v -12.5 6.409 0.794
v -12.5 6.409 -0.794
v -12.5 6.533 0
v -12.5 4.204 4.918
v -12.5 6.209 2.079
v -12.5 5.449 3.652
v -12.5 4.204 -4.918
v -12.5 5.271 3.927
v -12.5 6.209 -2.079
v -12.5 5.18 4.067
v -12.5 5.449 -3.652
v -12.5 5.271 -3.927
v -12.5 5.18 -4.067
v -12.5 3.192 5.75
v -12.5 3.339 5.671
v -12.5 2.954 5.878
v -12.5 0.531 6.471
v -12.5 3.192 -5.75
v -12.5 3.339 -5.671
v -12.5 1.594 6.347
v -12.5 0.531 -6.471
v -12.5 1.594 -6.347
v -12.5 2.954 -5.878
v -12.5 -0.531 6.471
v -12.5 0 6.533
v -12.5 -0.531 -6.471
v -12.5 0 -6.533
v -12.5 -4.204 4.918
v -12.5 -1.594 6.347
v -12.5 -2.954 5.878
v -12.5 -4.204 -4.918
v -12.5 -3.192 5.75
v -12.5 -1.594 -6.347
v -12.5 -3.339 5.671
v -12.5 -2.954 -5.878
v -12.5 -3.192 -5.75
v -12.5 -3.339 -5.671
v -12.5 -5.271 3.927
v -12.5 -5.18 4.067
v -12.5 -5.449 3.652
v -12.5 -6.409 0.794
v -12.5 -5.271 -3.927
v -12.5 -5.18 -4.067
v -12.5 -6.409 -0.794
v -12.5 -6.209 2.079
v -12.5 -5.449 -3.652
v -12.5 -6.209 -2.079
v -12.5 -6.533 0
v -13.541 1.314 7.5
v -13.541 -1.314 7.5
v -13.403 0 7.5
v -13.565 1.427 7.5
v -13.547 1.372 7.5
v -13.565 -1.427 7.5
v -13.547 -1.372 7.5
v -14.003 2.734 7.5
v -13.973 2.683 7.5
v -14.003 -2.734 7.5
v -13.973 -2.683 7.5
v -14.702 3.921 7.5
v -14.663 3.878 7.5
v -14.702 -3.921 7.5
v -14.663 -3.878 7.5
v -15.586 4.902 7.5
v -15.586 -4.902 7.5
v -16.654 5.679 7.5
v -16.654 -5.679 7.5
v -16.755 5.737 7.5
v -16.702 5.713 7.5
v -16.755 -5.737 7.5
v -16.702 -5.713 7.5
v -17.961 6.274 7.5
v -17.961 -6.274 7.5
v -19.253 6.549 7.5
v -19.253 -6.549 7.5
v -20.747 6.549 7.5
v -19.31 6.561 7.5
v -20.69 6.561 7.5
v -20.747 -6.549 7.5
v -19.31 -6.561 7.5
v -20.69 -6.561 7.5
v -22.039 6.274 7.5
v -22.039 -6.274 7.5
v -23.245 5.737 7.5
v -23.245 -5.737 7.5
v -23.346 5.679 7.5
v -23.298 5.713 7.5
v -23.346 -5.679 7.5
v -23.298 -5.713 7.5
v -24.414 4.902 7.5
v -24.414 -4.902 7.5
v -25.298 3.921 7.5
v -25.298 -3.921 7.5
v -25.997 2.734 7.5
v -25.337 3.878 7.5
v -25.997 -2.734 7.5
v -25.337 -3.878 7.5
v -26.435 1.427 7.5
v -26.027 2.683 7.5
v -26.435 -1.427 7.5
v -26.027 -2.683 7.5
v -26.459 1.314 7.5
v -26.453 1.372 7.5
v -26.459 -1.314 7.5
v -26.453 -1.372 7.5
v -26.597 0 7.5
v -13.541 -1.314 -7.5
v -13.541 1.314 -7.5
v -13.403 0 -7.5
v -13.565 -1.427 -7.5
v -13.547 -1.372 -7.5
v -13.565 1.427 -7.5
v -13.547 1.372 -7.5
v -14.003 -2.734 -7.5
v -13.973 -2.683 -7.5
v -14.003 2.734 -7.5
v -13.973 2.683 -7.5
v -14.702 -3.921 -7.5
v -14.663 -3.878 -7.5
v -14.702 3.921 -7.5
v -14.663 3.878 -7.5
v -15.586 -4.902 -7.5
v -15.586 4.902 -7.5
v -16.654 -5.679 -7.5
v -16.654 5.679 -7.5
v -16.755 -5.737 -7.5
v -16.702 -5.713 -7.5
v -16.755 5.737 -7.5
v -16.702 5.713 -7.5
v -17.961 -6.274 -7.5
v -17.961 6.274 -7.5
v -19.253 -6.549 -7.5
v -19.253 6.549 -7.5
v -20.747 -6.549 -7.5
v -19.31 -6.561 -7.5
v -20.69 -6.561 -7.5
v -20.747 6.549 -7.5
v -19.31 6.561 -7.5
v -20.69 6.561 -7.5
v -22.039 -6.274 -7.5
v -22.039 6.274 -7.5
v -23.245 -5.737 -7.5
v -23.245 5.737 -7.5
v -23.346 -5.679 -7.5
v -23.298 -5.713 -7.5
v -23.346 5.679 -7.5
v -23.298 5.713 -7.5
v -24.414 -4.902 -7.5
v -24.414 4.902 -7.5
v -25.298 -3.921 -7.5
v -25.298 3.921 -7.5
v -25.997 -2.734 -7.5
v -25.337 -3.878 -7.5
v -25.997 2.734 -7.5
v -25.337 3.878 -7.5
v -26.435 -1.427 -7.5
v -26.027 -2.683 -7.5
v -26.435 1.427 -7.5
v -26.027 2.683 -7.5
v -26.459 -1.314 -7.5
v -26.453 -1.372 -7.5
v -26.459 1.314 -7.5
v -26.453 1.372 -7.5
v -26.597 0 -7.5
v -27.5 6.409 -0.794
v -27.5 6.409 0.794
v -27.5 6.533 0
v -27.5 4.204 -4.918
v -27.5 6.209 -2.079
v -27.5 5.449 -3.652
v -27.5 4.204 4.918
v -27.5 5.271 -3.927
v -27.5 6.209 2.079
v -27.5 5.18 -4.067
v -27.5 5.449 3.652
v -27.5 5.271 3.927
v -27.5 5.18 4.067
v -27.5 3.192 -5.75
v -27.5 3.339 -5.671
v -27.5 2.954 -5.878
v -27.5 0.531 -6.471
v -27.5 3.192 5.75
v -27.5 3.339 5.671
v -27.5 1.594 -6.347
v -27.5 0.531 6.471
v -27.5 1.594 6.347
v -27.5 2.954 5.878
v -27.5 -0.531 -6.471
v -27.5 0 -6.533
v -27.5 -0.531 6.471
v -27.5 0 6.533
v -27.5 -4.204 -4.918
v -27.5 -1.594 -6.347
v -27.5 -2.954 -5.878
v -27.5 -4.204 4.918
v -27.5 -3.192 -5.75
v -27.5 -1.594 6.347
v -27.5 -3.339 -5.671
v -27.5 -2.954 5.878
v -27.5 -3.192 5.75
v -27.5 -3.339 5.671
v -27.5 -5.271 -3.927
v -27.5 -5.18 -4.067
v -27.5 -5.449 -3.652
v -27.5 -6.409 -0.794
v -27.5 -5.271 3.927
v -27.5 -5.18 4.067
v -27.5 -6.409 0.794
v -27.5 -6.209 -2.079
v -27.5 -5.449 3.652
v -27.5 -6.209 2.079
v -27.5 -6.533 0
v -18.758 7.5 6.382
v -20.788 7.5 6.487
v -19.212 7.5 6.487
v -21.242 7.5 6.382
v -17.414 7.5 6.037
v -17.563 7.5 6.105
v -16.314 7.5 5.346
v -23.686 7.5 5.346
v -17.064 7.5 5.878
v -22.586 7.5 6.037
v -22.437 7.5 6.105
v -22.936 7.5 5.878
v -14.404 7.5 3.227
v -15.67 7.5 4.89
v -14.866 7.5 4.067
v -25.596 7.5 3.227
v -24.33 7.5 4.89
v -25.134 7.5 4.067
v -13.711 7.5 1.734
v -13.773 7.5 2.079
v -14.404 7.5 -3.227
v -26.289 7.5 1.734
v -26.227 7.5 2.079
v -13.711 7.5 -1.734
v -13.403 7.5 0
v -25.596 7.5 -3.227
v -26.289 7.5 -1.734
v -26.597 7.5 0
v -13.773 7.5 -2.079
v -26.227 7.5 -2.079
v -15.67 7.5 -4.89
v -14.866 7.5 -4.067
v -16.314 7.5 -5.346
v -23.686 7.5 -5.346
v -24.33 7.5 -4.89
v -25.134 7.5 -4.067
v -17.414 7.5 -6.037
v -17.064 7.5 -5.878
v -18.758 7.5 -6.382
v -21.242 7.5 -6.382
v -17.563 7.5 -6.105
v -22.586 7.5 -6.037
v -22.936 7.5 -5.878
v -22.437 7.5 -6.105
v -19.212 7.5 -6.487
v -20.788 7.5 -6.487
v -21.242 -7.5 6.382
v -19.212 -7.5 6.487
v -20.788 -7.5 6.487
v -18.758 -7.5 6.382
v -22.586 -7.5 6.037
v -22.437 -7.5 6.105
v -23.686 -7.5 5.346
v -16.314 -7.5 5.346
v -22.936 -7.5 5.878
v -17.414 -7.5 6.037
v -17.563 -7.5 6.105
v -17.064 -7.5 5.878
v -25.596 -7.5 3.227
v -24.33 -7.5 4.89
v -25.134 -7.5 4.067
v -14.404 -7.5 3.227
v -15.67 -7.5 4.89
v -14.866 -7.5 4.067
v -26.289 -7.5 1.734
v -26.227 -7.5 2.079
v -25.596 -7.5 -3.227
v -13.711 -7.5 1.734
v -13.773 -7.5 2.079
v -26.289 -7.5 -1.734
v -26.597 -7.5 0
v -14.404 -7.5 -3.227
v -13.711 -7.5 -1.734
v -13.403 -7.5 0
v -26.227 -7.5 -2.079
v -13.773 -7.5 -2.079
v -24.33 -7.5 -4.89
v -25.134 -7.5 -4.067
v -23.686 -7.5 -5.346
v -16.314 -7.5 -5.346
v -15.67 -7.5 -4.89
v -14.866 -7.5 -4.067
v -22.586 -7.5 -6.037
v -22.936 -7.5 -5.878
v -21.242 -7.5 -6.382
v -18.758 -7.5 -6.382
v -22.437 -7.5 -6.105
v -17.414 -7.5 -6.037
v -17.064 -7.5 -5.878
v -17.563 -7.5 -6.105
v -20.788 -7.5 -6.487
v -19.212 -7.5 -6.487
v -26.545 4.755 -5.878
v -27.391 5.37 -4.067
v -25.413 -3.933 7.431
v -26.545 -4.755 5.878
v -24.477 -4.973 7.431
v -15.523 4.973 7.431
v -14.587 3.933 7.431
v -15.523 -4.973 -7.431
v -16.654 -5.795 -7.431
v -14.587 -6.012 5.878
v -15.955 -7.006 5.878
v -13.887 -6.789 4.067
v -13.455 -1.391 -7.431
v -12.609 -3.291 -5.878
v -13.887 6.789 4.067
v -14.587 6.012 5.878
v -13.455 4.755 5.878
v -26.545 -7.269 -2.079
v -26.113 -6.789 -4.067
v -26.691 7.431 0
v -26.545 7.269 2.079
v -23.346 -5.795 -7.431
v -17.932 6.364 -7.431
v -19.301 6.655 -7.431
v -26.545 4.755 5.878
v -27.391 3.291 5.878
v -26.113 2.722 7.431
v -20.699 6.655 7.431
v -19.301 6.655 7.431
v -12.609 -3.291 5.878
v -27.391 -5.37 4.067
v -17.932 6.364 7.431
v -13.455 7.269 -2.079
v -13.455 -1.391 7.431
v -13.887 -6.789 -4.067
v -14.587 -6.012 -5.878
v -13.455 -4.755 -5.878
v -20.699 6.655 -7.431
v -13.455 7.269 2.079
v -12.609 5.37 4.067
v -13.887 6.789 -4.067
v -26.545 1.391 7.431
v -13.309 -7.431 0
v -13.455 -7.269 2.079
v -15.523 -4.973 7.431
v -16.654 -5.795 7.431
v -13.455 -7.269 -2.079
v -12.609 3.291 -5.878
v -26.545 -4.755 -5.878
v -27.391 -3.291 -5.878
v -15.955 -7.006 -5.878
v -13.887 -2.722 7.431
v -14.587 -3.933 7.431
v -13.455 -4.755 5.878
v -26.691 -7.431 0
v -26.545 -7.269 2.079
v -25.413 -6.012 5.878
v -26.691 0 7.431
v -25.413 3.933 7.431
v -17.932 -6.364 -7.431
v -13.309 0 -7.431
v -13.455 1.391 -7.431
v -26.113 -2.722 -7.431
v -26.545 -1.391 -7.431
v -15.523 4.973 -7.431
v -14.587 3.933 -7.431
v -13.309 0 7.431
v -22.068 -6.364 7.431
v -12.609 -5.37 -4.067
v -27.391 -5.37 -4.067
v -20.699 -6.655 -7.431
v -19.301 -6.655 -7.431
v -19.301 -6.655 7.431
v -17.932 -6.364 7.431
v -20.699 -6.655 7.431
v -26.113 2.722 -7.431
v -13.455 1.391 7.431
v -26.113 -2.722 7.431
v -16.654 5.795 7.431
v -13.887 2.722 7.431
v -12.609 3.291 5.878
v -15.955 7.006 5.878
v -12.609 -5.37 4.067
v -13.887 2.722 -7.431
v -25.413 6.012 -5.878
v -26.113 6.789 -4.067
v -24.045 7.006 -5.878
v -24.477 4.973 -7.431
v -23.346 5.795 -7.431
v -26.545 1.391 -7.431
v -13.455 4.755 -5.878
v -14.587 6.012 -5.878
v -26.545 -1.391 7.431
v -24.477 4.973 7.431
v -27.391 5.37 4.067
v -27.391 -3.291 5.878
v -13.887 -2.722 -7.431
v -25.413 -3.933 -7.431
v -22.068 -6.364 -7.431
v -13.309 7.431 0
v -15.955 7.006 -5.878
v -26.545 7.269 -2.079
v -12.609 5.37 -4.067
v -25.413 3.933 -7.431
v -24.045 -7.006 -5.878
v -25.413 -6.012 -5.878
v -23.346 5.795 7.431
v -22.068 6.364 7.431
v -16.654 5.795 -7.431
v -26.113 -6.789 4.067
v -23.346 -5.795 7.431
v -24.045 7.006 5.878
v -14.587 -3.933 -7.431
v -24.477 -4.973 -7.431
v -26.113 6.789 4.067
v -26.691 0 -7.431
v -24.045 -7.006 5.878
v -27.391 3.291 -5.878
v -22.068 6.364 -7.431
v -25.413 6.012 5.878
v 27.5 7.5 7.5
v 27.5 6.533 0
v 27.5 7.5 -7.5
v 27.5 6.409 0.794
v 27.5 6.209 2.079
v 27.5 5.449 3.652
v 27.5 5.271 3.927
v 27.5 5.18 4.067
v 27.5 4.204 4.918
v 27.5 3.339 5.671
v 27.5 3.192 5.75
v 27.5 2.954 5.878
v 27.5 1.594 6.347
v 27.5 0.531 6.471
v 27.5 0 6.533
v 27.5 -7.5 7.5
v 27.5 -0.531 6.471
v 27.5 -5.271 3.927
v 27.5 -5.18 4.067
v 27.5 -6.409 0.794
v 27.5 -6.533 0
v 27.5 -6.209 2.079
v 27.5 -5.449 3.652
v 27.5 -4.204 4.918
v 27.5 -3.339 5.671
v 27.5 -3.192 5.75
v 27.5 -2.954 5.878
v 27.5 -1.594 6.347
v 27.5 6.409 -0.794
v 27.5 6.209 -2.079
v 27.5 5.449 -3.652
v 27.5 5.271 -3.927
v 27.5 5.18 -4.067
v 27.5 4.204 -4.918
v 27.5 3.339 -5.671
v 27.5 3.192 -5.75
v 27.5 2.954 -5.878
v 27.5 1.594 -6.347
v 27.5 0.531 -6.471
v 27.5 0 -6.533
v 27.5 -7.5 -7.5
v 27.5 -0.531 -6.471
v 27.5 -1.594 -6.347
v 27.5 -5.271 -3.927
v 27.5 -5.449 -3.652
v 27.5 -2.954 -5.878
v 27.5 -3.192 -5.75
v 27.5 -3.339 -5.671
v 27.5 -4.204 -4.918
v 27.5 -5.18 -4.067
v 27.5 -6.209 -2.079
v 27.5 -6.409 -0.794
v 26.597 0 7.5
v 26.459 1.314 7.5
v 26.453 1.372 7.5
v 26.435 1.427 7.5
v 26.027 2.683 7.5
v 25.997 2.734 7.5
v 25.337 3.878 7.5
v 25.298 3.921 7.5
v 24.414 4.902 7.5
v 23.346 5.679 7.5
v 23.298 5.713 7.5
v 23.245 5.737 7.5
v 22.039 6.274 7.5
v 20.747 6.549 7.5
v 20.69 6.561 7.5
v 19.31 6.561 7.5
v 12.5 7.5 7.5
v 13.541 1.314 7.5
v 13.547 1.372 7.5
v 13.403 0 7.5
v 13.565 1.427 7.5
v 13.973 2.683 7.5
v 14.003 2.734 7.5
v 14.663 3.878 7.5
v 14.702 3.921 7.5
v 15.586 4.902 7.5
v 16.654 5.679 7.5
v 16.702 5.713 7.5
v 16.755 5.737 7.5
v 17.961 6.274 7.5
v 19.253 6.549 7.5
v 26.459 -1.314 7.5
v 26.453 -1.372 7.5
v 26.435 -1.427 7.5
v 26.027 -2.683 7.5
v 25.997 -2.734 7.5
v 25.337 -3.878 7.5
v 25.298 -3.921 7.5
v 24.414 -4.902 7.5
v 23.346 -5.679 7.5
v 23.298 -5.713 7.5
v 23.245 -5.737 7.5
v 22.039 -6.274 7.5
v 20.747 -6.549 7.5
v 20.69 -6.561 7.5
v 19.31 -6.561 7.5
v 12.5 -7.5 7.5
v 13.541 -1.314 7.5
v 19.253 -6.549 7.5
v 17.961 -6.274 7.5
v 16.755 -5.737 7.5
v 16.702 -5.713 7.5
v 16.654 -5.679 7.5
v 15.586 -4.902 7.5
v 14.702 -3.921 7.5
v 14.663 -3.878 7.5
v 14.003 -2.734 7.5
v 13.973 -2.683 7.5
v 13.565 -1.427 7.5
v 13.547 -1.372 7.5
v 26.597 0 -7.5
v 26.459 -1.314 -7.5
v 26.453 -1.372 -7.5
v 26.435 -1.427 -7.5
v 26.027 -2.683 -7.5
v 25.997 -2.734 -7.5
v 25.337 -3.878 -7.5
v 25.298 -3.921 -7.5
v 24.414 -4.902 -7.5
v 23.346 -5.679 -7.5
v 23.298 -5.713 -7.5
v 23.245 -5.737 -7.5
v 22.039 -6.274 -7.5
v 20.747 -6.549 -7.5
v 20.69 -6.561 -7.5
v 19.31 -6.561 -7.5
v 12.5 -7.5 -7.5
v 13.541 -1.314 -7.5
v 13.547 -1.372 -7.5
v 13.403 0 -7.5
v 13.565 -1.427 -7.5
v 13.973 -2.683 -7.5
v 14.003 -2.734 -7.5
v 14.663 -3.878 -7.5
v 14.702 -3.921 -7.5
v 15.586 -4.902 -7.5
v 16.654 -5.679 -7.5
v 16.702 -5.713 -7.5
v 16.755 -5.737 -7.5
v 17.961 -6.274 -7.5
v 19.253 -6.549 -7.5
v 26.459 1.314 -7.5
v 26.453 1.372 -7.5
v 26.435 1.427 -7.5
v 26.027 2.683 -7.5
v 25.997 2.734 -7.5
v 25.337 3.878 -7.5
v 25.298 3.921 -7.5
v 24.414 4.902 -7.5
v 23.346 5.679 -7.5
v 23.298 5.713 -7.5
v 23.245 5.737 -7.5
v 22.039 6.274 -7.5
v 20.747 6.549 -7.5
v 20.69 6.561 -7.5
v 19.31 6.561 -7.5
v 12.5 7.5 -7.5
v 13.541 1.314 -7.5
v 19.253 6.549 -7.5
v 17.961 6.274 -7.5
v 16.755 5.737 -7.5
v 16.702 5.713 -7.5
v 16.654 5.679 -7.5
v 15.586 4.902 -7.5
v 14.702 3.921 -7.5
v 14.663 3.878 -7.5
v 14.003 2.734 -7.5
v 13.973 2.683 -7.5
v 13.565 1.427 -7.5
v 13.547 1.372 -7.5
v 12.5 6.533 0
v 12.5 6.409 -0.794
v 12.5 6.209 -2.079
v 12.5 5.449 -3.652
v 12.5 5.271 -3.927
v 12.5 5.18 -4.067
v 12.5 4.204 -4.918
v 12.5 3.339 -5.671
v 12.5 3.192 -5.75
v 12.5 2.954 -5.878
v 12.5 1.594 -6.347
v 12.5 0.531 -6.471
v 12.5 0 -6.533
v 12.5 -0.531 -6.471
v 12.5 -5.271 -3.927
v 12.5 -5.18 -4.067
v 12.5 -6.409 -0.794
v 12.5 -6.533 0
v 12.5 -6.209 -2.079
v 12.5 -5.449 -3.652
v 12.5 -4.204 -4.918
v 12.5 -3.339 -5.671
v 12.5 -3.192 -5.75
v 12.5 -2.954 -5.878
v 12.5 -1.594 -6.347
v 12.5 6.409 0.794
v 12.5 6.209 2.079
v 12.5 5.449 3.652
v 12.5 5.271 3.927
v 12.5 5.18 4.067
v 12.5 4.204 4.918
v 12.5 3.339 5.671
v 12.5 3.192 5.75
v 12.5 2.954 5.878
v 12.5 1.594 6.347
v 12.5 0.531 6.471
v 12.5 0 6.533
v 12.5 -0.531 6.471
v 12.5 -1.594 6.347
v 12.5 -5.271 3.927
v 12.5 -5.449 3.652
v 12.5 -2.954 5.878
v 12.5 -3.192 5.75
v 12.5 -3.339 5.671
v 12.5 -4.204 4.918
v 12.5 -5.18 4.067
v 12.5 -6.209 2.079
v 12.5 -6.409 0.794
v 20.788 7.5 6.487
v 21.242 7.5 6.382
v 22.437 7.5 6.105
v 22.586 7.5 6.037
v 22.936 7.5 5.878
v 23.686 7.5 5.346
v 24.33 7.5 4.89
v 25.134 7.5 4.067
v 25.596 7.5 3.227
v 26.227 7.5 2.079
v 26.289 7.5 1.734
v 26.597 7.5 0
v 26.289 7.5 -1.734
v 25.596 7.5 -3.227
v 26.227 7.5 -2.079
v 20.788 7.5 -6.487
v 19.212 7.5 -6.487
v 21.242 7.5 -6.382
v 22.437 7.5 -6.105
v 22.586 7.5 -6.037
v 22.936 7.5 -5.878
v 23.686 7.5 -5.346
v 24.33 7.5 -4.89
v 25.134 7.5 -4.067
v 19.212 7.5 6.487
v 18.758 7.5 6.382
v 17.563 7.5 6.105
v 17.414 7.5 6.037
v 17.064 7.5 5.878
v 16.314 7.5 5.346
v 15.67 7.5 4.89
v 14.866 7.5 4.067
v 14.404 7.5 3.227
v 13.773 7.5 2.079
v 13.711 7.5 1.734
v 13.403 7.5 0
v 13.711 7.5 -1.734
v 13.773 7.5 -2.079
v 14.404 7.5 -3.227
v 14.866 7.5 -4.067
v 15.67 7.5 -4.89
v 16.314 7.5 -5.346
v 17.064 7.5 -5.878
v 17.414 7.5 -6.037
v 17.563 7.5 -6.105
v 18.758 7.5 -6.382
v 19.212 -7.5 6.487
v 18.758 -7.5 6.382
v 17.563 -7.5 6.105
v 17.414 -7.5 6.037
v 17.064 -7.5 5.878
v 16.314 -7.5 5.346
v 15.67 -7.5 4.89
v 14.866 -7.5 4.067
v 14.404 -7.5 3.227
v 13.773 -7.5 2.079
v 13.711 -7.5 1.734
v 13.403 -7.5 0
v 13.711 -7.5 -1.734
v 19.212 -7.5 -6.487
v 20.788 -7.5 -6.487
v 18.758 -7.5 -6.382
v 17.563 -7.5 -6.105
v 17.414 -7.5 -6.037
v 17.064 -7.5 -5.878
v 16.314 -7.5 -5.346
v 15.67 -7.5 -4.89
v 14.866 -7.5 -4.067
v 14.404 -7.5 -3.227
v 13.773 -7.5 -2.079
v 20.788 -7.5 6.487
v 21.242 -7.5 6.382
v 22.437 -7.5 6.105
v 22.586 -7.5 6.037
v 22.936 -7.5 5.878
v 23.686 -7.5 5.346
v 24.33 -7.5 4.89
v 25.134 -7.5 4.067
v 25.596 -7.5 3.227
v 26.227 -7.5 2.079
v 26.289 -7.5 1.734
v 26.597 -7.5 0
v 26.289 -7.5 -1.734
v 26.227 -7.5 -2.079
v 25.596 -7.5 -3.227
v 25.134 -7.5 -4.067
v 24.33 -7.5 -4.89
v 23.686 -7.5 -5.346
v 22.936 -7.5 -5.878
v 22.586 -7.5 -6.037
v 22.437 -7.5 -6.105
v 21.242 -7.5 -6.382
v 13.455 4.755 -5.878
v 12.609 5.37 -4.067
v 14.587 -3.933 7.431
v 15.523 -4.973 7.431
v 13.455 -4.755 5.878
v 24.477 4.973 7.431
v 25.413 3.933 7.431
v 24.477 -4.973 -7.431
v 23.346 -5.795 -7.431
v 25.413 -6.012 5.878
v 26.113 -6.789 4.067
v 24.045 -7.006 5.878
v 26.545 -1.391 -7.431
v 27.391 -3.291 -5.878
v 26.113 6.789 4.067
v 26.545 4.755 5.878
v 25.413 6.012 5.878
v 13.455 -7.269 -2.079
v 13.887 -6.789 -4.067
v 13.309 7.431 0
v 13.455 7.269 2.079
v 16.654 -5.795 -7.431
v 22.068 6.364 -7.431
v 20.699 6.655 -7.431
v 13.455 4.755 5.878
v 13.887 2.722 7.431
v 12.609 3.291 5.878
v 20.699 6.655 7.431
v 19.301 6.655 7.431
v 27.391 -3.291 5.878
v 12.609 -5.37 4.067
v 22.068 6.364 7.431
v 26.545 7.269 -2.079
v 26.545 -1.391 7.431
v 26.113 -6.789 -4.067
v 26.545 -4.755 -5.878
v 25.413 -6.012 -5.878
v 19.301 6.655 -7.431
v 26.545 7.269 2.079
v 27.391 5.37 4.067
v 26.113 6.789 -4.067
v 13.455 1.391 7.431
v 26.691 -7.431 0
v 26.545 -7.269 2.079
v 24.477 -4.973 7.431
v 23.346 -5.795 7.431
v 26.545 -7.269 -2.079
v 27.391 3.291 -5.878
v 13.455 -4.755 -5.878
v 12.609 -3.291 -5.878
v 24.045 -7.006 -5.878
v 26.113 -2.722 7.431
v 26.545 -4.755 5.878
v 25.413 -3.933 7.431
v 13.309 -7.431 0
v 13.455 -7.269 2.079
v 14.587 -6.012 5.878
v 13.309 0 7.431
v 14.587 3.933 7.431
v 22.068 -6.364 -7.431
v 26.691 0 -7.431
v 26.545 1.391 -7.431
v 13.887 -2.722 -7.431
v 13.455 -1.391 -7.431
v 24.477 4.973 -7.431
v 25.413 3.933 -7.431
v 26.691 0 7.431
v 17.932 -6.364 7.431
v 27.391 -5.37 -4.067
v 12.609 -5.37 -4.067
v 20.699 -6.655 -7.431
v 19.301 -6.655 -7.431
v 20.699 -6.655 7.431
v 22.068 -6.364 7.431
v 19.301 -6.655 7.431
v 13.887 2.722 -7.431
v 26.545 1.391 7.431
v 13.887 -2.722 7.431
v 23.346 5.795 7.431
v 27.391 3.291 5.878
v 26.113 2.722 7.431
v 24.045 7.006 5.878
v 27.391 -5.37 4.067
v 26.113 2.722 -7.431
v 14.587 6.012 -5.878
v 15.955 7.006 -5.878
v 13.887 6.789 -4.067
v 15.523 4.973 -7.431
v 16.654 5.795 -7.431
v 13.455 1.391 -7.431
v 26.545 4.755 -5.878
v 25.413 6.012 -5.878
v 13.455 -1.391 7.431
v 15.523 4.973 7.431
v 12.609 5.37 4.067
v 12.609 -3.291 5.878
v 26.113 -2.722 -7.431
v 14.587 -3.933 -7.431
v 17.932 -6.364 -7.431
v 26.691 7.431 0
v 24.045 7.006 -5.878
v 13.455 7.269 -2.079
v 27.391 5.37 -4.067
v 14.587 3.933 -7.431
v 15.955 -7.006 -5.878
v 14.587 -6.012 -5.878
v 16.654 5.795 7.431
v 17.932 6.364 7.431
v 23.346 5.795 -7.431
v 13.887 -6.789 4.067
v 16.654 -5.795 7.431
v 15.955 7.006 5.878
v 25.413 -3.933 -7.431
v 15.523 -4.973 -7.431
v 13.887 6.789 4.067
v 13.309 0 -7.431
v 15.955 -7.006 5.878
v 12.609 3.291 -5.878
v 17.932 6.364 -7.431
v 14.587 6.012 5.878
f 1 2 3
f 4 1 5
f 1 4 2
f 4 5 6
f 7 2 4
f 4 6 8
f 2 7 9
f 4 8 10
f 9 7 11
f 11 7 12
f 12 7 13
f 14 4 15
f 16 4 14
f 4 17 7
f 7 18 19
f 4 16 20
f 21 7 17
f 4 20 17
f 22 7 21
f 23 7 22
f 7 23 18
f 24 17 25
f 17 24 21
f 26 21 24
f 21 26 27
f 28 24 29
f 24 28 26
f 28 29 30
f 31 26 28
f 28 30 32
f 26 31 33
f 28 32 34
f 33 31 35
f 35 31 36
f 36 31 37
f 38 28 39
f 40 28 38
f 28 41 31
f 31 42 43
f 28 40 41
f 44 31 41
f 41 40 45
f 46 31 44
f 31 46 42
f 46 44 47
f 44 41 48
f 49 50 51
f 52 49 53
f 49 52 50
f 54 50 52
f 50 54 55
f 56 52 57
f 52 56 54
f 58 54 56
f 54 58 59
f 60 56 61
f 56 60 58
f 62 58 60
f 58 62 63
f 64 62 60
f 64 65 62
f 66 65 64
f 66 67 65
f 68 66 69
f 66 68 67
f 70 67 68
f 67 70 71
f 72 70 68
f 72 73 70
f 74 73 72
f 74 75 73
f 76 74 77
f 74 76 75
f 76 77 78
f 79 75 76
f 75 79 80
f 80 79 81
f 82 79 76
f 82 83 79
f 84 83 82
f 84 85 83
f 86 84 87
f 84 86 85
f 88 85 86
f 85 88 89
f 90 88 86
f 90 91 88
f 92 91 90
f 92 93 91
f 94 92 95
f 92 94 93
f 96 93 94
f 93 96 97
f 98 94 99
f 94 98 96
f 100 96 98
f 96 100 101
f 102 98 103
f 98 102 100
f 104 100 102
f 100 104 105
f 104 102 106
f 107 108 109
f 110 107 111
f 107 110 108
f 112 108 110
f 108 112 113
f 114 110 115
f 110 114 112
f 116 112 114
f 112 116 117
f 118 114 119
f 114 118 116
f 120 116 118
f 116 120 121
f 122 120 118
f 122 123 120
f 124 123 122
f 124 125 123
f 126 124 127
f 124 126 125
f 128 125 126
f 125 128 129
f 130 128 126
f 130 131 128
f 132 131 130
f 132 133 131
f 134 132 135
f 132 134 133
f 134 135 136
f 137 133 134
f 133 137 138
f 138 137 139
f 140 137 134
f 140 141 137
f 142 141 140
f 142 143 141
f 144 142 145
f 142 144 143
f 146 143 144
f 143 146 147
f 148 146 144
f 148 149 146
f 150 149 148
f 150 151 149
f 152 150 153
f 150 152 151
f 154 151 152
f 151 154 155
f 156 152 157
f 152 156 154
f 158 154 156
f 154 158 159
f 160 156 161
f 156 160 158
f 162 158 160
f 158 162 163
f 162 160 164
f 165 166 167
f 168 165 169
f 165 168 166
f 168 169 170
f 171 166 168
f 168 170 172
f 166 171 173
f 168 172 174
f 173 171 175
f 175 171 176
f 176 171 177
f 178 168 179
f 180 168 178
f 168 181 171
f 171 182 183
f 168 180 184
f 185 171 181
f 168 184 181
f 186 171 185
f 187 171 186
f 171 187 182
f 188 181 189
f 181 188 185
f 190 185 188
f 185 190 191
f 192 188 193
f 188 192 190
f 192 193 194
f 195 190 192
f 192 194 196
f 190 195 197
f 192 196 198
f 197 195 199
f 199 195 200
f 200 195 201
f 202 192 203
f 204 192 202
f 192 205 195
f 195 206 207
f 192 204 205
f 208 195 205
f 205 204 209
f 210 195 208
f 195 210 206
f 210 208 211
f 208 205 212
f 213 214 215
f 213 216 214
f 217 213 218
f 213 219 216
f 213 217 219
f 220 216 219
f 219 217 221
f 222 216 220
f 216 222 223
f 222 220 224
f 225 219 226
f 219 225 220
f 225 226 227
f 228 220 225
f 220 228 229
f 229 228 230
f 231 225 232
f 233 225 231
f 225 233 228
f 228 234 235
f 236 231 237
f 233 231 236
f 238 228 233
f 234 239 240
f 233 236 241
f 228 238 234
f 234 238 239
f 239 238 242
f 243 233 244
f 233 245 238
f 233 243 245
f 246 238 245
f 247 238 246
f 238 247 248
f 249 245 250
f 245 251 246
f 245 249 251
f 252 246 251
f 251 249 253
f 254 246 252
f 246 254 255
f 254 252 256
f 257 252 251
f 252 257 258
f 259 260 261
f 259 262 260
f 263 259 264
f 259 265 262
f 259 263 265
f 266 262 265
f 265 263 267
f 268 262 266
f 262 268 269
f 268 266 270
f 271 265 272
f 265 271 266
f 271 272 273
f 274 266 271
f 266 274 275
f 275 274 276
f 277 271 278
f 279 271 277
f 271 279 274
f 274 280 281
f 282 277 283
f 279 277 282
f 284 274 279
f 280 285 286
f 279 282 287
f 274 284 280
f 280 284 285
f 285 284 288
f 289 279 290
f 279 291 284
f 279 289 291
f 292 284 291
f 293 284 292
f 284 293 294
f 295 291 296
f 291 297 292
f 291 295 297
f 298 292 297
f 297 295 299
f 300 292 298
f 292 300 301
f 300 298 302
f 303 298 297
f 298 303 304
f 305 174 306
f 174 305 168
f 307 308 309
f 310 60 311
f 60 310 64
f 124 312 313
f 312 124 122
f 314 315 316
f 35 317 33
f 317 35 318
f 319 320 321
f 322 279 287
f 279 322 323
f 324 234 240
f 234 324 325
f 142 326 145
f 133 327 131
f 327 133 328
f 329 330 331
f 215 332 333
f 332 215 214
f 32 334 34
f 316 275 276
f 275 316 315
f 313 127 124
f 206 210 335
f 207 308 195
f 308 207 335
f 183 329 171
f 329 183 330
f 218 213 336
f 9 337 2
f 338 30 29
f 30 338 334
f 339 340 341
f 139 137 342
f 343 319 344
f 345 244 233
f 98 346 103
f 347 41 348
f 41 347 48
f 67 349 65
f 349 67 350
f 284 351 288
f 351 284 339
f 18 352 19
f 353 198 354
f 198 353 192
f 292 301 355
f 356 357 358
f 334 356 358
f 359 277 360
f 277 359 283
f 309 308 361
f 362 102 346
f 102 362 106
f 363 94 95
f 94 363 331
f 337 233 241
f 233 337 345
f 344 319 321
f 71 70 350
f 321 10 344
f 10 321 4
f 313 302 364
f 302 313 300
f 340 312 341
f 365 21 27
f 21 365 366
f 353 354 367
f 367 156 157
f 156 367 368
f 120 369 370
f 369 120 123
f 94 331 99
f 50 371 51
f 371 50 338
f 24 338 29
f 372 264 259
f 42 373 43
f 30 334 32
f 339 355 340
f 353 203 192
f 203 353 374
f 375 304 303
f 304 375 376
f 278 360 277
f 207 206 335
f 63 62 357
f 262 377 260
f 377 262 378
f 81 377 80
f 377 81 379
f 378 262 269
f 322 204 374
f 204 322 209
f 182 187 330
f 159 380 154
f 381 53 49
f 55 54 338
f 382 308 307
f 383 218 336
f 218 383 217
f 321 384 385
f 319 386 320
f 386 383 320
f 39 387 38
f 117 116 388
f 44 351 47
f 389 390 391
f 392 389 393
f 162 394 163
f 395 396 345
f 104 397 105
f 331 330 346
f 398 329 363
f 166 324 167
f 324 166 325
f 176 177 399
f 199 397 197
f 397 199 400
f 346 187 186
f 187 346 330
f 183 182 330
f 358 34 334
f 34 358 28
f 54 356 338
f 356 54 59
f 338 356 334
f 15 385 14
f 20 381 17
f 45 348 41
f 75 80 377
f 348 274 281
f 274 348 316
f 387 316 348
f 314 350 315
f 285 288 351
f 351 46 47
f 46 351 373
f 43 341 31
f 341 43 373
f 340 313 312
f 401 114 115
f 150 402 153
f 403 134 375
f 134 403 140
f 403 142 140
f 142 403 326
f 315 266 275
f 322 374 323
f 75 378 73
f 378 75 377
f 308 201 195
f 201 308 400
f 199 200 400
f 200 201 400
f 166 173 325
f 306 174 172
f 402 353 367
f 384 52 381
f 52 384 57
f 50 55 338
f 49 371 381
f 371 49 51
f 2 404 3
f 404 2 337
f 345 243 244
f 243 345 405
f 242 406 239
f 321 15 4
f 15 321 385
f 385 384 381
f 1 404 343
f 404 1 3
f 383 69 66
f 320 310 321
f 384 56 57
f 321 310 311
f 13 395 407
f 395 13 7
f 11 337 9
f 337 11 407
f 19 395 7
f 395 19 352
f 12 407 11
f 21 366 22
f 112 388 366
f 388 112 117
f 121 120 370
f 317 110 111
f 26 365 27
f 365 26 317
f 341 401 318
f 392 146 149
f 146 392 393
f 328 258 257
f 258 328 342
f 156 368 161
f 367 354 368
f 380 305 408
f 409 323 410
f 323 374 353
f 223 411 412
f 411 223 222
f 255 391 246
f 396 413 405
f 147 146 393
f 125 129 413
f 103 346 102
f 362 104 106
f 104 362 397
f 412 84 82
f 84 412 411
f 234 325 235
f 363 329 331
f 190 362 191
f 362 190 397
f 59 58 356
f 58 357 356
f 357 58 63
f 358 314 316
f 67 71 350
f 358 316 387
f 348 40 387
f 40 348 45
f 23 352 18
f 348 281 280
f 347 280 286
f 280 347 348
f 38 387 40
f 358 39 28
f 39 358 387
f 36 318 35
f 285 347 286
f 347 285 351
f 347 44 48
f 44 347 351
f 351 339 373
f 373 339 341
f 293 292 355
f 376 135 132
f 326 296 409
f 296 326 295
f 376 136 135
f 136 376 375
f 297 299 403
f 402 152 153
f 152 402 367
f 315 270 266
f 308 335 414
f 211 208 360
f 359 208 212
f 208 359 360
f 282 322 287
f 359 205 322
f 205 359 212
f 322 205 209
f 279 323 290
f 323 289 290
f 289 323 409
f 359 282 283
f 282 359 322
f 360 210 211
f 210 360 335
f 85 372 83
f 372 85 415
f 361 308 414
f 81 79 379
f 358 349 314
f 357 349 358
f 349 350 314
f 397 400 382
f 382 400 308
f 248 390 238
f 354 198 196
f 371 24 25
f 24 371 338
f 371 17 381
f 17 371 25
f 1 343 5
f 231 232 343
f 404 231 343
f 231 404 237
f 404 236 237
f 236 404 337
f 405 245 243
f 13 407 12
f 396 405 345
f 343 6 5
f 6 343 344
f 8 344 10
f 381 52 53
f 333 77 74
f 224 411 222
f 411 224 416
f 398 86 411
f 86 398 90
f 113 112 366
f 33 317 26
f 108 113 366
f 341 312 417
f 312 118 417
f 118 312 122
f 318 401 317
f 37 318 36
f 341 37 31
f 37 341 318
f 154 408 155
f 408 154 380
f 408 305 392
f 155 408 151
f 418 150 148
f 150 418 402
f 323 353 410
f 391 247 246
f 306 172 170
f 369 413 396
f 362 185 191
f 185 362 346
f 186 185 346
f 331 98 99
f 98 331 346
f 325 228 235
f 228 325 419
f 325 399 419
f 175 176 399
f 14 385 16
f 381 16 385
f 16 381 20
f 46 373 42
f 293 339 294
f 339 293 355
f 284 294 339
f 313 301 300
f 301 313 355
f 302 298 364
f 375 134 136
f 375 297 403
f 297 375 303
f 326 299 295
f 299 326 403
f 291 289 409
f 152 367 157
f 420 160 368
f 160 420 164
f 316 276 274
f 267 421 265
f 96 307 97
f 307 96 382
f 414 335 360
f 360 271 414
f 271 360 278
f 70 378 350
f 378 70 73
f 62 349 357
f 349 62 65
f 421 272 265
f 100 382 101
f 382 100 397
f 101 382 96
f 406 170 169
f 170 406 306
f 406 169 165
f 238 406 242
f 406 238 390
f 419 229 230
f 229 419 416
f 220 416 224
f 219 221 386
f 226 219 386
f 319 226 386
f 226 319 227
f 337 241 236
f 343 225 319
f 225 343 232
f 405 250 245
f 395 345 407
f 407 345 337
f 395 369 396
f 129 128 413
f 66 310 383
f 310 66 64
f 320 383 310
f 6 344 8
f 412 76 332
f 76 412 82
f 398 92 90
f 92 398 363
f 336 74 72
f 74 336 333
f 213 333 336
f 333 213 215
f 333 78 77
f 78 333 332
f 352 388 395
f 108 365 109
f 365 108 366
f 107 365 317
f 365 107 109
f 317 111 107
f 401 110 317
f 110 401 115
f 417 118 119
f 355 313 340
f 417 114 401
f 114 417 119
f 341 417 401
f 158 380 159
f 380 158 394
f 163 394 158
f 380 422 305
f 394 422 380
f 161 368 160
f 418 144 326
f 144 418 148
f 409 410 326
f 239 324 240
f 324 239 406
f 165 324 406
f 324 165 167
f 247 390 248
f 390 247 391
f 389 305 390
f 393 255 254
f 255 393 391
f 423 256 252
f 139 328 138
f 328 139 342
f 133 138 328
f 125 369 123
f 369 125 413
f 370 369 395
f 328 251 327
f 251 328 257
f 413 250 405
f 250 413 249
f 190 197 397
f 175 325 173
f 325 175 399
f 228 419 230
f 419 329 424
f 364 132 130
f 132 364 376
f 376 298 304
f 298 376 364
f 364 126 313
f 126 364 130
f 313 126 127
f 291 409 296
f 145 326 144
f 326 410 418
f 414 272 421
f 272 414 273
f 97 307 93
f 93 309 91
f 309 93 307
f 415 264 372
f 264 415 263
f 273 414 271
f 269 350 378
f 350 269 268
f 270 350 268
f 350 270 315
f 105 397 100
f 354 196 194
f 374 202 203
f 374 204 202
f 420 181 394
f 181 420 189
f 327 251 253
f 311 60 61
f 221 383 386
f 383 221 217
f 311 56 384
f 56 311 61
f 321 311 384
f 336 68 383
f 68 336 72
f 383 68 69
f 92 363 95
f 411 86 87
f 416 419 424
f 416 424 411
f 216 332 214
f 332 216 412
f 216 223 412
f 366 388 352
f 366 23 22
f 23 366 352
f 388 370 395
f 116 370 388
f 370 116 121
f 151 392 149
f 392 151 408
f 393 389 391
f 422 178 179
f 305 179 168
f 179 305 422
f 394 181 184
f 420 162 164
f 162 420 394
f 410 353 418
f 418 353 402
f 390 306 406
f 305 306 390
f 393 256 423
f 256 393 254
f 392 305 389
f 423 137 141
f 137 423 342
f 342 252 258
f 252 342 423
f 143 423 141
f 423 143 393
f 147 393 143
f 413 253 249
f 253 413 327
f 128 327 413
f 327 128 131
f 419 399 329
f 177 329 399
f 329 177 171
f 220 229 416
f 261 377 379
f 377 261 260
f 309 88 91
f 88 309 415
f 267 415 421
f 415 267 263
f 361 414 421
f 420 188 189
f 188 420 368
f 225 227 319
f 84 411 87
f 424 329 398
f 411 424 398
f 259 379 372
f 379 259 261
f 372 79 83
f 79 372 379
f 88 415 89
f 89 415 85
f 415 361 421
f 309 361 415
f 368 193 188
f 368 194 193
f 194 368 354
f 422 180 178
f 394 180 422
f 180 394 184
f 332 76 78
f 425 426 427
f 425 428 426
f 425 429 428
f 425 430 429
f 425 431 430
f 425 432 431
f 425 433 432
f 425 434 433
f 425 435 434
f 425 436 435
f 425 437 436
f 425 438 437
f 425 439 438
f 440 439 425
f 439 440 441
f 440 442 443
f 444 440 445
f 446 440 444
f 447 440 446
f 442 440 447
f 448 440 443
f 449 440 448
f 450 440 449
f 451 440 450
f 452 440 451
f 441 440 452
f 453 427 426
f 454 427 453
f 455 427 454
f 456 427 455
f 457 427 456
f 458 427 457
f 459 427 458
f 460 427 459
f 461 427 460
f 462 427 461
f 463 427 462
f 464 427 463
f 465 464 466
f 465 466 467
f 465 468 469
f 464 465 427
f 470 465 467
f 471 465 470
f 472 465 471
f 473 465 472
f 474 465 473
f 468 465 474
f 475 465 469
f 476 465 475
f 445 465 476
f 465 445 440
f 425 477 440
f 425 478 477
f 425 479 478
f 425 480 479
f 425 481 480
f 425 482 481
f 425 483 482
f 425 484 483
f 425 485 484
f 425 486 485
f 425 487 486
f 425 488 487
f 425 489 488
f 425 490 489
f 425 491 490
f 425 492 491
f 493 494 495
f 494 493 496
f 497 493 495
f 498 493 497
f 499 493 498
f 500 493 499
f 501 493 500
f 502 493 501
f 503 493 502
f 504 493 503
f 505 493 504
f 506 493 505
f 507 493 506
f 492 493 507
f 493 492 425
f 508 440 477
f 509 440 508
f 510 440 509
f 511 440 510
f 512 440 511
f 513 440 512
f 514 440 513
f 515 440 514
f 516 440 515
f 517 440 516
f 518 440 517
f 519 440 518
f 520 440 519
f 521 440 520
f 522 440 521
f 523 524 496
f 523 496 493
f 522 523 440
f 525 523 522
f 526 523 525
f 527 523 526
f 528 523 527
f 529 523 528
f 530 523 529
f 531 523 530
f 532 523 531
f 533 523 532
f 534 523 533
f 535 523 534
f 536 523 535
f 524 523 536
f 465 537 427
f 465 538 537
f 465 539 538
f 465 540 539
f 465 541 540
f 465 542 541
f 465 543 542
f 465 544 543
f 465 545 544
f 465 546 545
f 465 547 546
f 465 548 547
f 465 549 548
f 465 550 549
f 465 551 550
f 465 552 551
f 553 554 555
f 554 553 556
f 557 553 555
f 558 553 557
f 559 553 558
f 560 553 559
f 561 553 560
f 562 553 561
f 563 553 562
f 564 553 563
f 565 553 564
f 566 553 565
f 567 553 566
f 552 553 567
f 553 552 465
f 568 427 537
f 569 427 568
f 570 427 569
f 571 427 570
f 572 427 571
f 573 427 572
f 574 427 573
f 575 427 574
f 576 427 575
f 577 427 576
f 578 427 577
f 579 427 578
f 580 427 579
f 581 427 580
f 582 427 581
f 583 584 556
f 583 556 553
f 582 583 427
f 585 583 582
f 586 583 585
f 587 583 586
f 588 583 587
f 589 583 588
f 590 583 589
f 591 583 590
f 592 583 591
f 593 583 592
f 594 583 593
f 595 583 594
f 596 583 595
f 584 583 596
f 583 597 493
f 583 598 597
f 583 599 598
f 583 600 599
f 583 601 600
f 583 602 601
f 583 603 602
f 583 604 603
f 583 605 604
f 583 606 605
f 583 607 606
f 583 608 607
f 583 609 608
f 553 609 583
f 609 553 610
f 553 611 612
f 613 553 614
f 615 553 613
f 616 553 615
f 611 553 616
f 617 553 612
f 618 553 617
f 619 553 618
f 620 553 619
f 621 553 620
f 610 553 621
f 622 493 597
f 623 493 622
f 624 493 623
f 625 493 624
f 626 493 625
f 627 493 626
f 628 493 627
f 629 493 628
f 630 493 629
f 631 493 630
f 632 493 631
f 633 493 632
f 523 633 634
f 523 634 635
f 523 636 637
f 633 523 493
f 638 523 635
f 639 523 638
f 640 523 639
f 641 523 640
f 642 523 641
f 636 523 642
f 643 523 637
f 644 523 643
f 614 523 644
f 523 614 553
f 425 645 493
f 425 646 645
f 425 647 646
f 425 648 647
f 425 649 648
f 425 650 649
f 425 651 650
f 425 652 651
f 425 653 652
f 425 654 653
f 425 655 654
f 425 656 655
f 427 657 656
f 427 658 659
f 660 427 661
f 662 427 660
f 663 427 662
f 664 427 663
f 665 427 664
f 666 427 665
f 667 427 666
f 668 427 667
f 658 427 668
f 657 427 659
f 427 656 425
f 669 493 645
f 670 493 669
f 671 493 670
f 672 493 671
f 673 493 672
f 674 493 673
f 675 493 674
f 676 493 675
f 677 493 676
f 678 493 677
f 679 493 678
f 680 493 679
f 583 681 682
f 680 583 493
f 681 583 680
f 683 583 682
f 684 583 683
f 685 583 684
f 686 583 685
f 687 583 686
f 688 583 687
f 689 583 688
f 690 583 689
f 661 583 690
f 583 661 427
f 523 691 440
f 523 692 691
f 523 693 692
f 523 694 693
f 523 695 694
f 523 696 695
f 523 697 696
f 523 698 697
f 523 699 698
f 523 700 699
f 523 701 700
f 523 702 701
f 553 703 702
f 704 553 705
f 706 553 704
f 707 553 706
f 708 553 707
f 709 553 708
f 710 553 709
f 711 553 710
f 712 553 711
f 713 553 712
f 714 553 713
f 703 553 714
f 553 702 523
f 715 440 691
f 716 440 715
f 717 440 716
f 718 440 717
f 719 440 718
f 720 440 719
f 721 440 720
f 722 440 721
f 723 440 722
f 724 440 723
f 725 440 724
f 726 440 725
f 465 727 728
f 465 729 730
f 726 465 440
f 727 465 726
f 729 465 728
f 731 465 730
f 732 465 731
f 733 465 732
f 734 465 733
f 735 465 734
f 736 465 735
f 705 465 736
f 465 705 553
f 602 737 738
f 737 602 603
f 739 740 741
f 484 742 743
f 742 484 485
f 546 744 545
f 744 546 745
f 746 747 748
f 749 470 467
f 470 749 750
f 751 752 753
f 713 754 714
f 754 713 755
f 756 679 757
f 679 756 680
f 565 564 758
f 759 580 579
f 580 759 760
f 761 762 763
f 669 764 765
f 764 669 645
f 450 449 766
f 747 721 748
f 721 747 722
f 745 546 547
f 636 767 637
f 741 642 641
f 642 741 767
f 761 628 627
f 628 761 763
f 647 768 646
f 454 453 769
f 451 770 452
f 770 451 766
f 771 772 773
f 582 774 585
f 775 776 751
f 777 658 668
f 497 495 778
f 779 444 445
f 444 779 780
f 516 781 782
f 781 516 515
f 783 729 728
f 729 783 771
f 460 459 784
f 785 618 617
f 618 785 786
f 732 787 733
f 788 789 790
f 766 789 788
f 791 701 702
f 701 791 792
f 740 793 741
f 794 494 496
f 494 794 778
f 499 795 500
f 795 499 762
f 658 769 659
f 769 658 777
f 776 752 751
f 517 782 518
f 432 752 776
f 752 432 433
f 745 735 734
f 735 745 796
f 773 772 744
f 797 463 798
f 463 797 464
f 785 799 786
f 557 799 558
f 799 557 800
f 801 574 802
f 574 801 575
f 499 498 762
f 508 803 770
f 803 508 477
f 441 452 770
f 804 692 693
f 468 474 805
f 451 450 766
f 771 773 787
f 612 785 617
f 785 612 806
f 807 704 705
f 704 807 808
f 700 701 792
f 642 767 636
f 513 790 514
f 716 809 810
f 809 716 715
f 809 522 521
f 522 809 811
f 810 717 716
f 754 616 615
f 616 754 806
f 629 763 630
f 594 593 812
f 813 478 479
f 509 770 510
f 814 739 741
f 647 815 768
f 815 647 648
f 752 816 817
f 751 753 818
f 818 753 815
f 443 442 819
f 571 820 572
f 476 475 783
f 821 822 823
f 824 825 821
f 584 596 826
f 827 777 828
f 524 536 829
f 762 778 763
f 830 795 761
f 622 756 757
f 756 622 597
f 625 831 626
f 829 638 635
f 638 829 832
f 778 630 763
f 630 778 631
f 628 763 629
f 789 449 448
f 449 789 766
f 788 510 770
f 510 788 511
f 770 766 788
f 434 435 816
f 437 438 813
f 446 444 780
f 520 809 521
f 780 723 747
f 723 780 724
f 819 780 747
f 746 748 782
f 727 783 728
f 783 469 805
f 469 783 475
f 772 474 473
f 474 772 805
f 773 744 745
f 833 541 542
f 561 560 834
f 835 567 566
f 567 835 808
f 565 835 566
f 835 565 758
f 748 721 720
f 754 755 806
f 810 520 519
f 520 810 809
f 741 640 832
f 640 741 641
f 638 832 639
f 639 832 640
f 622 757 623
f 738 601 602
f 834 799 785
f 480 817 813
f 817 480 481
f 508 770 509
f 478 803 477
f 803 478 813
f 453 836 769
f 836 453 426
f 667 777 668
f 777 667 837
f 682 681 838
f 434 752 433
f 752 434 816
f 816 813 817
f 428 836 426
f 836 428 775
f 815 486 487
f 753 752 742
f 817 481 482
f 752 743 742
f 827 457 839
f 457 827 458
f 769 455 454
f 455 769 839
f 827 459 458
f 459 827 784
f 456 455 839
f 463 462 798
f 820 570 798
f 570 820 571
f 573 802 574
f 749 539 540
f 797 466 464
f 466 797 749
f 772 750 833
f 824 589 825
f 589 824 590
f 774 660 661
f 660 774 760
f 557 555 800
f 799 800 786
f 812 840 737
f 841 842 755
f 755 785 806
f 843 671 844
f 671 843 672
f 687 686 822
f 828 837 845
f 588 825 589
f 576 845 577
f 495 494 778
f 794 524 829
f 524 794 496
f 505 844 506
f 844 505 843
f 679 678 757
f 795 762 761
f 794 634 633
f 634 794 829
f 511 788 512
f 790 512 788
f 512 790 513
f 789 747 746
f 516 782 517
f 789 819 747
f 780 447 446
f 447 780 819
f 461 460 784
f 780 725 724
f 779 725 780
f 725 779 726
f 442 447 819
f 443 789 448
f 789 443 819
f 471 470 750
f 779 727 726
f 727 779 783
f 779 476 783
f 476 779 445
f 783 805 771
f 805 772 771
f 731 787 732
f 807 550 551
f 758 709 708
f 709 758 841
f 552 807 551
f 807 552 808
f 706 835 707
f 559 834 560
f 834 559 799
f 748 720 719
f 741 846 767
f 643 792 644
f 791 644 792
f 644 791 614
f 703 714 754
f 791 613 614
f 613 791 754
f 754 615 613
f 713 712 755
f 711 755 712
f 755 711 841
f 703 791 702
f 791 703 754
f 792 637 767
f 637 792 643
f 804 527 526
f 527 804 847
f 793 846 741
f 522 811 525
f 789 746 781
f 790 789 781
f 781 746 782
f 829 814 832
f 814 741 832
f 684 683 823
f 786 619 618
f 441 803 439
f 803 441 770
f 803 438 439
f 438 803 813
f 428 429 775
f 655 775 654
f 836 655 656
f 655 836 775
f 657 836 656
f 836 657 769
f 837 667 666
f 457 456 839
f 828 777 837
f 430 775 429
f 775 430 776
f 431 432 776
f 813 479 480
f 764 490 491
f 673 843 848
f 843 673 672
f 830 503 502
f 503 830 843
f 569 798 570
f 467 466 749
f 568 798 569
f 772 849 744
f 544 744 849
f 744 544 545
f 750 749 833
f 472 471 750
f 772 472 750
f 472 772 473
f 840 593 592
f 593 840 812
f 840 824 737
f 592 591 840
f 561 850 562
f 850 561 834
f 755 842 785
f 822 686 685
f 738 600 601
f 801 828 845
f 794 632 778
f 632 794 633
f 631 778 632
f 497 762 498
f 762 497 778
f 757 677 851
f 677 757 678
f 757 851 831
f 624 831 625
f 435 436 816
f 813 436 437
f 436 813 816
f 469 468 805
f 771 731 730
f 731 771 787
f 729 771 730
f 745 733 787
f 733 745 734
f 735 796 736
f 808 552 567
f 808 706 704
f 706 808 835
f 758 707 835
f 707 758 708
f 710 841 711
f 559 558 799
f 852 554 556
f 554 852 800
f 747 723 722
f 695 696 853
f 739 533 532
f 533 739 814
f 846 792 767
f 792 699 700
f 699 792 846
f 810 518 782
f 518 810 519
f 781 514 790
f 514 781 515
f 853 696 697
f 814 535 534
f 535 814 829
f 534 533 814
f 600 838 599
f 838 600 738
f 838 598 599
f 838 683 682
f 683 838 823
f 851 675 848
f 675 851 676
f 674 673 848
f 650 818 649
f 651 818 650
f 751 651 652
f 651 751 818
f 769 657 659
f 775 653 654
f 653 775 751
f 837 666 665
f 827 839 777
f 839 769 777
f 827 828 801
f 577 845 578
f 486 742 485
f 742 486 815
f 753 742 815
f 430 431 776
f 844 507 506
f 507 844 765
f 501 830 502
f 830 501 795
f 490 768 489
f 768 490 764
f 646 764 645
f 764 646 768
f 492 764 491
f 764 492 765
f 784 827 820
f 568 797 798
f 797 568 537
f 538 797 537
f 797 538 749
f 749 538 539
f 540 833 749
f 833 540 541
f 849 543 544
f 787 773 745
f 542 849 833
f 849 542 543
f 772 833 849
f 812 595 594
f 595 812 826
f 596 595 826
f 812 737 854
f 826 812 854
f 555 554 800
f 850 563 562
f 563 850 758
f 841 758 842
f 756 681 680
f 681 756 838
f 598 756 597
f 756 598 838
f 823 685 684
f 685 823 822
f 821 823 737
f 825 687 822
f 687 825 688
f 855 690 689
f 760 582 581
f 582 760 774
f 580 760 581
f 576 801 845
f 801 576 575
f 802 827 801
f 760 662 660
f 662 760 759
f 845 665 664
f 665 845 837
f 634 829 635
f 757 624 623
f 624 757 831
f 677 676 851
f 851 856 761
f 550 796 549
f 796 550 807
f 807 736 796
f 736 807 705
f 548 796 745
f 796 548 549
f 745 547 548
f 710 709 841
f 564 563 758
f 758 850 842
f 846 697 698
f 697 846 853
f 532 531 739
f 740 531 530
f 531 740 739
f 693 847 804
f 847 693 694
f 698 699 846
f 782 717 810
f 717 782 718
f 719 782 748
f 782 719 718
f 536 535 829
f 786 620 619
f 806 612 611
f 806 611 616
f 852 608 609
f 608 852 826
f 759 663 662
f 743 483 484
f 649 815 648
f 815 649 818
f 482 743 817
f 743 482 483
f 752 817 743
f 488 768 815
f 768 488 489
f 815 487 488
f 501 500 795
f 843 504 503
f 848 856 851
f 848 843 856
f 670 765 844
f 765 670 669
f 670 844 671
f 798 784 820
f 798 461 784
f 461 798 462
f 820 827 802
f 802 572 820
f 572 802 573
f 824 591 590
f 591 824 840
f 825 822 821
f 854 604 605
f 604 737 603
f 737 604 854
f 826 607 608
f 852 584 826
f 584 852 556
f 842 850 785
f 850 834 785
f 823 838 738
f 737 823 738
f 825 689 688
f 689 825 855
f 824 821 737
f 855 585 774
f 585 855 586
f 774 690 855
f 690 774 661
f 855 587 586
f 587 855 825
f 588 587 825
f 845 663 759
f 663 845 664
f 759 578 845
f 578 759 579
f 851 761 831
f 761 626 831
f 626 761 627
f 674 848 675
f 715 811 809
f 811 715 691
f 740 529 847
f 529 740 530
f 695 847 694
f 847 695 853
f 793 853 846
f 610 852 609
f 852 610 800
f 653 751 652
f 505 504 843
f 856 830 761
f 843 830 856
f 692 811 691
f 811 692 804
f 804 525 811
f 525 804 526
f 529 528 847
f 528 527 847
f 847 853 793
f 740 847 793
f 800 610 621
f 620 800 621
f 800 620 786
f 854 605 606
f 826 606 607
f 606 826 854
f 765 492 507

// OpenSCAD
// CSG.scad - Basic example of CSG usage

translate([-20,0,0]) {
intersection() {
    cube(15, center=true);
    sphere(10);
}
}

translate([20,0,0]) {
    difference() {
        cube(15, center=true);
        sphere(10);
    }
}

echo(version=version());
// Written by Marius Kintel <marius@kintel.net>
//
// To the extent possible under law, the author(s) have dedicated all
// copyright and related and neighboring rights to this software to the
// public domain worldwide. This software is distributed without any
// warranty.
//
// You should have received a copy of the CC0 Public Domain
// Dedication along with this software.
// If not, see [ 10.52, 21.39, 36.47 ]<http://creativecommons.org/publicdomain/zero/1.0/>.
